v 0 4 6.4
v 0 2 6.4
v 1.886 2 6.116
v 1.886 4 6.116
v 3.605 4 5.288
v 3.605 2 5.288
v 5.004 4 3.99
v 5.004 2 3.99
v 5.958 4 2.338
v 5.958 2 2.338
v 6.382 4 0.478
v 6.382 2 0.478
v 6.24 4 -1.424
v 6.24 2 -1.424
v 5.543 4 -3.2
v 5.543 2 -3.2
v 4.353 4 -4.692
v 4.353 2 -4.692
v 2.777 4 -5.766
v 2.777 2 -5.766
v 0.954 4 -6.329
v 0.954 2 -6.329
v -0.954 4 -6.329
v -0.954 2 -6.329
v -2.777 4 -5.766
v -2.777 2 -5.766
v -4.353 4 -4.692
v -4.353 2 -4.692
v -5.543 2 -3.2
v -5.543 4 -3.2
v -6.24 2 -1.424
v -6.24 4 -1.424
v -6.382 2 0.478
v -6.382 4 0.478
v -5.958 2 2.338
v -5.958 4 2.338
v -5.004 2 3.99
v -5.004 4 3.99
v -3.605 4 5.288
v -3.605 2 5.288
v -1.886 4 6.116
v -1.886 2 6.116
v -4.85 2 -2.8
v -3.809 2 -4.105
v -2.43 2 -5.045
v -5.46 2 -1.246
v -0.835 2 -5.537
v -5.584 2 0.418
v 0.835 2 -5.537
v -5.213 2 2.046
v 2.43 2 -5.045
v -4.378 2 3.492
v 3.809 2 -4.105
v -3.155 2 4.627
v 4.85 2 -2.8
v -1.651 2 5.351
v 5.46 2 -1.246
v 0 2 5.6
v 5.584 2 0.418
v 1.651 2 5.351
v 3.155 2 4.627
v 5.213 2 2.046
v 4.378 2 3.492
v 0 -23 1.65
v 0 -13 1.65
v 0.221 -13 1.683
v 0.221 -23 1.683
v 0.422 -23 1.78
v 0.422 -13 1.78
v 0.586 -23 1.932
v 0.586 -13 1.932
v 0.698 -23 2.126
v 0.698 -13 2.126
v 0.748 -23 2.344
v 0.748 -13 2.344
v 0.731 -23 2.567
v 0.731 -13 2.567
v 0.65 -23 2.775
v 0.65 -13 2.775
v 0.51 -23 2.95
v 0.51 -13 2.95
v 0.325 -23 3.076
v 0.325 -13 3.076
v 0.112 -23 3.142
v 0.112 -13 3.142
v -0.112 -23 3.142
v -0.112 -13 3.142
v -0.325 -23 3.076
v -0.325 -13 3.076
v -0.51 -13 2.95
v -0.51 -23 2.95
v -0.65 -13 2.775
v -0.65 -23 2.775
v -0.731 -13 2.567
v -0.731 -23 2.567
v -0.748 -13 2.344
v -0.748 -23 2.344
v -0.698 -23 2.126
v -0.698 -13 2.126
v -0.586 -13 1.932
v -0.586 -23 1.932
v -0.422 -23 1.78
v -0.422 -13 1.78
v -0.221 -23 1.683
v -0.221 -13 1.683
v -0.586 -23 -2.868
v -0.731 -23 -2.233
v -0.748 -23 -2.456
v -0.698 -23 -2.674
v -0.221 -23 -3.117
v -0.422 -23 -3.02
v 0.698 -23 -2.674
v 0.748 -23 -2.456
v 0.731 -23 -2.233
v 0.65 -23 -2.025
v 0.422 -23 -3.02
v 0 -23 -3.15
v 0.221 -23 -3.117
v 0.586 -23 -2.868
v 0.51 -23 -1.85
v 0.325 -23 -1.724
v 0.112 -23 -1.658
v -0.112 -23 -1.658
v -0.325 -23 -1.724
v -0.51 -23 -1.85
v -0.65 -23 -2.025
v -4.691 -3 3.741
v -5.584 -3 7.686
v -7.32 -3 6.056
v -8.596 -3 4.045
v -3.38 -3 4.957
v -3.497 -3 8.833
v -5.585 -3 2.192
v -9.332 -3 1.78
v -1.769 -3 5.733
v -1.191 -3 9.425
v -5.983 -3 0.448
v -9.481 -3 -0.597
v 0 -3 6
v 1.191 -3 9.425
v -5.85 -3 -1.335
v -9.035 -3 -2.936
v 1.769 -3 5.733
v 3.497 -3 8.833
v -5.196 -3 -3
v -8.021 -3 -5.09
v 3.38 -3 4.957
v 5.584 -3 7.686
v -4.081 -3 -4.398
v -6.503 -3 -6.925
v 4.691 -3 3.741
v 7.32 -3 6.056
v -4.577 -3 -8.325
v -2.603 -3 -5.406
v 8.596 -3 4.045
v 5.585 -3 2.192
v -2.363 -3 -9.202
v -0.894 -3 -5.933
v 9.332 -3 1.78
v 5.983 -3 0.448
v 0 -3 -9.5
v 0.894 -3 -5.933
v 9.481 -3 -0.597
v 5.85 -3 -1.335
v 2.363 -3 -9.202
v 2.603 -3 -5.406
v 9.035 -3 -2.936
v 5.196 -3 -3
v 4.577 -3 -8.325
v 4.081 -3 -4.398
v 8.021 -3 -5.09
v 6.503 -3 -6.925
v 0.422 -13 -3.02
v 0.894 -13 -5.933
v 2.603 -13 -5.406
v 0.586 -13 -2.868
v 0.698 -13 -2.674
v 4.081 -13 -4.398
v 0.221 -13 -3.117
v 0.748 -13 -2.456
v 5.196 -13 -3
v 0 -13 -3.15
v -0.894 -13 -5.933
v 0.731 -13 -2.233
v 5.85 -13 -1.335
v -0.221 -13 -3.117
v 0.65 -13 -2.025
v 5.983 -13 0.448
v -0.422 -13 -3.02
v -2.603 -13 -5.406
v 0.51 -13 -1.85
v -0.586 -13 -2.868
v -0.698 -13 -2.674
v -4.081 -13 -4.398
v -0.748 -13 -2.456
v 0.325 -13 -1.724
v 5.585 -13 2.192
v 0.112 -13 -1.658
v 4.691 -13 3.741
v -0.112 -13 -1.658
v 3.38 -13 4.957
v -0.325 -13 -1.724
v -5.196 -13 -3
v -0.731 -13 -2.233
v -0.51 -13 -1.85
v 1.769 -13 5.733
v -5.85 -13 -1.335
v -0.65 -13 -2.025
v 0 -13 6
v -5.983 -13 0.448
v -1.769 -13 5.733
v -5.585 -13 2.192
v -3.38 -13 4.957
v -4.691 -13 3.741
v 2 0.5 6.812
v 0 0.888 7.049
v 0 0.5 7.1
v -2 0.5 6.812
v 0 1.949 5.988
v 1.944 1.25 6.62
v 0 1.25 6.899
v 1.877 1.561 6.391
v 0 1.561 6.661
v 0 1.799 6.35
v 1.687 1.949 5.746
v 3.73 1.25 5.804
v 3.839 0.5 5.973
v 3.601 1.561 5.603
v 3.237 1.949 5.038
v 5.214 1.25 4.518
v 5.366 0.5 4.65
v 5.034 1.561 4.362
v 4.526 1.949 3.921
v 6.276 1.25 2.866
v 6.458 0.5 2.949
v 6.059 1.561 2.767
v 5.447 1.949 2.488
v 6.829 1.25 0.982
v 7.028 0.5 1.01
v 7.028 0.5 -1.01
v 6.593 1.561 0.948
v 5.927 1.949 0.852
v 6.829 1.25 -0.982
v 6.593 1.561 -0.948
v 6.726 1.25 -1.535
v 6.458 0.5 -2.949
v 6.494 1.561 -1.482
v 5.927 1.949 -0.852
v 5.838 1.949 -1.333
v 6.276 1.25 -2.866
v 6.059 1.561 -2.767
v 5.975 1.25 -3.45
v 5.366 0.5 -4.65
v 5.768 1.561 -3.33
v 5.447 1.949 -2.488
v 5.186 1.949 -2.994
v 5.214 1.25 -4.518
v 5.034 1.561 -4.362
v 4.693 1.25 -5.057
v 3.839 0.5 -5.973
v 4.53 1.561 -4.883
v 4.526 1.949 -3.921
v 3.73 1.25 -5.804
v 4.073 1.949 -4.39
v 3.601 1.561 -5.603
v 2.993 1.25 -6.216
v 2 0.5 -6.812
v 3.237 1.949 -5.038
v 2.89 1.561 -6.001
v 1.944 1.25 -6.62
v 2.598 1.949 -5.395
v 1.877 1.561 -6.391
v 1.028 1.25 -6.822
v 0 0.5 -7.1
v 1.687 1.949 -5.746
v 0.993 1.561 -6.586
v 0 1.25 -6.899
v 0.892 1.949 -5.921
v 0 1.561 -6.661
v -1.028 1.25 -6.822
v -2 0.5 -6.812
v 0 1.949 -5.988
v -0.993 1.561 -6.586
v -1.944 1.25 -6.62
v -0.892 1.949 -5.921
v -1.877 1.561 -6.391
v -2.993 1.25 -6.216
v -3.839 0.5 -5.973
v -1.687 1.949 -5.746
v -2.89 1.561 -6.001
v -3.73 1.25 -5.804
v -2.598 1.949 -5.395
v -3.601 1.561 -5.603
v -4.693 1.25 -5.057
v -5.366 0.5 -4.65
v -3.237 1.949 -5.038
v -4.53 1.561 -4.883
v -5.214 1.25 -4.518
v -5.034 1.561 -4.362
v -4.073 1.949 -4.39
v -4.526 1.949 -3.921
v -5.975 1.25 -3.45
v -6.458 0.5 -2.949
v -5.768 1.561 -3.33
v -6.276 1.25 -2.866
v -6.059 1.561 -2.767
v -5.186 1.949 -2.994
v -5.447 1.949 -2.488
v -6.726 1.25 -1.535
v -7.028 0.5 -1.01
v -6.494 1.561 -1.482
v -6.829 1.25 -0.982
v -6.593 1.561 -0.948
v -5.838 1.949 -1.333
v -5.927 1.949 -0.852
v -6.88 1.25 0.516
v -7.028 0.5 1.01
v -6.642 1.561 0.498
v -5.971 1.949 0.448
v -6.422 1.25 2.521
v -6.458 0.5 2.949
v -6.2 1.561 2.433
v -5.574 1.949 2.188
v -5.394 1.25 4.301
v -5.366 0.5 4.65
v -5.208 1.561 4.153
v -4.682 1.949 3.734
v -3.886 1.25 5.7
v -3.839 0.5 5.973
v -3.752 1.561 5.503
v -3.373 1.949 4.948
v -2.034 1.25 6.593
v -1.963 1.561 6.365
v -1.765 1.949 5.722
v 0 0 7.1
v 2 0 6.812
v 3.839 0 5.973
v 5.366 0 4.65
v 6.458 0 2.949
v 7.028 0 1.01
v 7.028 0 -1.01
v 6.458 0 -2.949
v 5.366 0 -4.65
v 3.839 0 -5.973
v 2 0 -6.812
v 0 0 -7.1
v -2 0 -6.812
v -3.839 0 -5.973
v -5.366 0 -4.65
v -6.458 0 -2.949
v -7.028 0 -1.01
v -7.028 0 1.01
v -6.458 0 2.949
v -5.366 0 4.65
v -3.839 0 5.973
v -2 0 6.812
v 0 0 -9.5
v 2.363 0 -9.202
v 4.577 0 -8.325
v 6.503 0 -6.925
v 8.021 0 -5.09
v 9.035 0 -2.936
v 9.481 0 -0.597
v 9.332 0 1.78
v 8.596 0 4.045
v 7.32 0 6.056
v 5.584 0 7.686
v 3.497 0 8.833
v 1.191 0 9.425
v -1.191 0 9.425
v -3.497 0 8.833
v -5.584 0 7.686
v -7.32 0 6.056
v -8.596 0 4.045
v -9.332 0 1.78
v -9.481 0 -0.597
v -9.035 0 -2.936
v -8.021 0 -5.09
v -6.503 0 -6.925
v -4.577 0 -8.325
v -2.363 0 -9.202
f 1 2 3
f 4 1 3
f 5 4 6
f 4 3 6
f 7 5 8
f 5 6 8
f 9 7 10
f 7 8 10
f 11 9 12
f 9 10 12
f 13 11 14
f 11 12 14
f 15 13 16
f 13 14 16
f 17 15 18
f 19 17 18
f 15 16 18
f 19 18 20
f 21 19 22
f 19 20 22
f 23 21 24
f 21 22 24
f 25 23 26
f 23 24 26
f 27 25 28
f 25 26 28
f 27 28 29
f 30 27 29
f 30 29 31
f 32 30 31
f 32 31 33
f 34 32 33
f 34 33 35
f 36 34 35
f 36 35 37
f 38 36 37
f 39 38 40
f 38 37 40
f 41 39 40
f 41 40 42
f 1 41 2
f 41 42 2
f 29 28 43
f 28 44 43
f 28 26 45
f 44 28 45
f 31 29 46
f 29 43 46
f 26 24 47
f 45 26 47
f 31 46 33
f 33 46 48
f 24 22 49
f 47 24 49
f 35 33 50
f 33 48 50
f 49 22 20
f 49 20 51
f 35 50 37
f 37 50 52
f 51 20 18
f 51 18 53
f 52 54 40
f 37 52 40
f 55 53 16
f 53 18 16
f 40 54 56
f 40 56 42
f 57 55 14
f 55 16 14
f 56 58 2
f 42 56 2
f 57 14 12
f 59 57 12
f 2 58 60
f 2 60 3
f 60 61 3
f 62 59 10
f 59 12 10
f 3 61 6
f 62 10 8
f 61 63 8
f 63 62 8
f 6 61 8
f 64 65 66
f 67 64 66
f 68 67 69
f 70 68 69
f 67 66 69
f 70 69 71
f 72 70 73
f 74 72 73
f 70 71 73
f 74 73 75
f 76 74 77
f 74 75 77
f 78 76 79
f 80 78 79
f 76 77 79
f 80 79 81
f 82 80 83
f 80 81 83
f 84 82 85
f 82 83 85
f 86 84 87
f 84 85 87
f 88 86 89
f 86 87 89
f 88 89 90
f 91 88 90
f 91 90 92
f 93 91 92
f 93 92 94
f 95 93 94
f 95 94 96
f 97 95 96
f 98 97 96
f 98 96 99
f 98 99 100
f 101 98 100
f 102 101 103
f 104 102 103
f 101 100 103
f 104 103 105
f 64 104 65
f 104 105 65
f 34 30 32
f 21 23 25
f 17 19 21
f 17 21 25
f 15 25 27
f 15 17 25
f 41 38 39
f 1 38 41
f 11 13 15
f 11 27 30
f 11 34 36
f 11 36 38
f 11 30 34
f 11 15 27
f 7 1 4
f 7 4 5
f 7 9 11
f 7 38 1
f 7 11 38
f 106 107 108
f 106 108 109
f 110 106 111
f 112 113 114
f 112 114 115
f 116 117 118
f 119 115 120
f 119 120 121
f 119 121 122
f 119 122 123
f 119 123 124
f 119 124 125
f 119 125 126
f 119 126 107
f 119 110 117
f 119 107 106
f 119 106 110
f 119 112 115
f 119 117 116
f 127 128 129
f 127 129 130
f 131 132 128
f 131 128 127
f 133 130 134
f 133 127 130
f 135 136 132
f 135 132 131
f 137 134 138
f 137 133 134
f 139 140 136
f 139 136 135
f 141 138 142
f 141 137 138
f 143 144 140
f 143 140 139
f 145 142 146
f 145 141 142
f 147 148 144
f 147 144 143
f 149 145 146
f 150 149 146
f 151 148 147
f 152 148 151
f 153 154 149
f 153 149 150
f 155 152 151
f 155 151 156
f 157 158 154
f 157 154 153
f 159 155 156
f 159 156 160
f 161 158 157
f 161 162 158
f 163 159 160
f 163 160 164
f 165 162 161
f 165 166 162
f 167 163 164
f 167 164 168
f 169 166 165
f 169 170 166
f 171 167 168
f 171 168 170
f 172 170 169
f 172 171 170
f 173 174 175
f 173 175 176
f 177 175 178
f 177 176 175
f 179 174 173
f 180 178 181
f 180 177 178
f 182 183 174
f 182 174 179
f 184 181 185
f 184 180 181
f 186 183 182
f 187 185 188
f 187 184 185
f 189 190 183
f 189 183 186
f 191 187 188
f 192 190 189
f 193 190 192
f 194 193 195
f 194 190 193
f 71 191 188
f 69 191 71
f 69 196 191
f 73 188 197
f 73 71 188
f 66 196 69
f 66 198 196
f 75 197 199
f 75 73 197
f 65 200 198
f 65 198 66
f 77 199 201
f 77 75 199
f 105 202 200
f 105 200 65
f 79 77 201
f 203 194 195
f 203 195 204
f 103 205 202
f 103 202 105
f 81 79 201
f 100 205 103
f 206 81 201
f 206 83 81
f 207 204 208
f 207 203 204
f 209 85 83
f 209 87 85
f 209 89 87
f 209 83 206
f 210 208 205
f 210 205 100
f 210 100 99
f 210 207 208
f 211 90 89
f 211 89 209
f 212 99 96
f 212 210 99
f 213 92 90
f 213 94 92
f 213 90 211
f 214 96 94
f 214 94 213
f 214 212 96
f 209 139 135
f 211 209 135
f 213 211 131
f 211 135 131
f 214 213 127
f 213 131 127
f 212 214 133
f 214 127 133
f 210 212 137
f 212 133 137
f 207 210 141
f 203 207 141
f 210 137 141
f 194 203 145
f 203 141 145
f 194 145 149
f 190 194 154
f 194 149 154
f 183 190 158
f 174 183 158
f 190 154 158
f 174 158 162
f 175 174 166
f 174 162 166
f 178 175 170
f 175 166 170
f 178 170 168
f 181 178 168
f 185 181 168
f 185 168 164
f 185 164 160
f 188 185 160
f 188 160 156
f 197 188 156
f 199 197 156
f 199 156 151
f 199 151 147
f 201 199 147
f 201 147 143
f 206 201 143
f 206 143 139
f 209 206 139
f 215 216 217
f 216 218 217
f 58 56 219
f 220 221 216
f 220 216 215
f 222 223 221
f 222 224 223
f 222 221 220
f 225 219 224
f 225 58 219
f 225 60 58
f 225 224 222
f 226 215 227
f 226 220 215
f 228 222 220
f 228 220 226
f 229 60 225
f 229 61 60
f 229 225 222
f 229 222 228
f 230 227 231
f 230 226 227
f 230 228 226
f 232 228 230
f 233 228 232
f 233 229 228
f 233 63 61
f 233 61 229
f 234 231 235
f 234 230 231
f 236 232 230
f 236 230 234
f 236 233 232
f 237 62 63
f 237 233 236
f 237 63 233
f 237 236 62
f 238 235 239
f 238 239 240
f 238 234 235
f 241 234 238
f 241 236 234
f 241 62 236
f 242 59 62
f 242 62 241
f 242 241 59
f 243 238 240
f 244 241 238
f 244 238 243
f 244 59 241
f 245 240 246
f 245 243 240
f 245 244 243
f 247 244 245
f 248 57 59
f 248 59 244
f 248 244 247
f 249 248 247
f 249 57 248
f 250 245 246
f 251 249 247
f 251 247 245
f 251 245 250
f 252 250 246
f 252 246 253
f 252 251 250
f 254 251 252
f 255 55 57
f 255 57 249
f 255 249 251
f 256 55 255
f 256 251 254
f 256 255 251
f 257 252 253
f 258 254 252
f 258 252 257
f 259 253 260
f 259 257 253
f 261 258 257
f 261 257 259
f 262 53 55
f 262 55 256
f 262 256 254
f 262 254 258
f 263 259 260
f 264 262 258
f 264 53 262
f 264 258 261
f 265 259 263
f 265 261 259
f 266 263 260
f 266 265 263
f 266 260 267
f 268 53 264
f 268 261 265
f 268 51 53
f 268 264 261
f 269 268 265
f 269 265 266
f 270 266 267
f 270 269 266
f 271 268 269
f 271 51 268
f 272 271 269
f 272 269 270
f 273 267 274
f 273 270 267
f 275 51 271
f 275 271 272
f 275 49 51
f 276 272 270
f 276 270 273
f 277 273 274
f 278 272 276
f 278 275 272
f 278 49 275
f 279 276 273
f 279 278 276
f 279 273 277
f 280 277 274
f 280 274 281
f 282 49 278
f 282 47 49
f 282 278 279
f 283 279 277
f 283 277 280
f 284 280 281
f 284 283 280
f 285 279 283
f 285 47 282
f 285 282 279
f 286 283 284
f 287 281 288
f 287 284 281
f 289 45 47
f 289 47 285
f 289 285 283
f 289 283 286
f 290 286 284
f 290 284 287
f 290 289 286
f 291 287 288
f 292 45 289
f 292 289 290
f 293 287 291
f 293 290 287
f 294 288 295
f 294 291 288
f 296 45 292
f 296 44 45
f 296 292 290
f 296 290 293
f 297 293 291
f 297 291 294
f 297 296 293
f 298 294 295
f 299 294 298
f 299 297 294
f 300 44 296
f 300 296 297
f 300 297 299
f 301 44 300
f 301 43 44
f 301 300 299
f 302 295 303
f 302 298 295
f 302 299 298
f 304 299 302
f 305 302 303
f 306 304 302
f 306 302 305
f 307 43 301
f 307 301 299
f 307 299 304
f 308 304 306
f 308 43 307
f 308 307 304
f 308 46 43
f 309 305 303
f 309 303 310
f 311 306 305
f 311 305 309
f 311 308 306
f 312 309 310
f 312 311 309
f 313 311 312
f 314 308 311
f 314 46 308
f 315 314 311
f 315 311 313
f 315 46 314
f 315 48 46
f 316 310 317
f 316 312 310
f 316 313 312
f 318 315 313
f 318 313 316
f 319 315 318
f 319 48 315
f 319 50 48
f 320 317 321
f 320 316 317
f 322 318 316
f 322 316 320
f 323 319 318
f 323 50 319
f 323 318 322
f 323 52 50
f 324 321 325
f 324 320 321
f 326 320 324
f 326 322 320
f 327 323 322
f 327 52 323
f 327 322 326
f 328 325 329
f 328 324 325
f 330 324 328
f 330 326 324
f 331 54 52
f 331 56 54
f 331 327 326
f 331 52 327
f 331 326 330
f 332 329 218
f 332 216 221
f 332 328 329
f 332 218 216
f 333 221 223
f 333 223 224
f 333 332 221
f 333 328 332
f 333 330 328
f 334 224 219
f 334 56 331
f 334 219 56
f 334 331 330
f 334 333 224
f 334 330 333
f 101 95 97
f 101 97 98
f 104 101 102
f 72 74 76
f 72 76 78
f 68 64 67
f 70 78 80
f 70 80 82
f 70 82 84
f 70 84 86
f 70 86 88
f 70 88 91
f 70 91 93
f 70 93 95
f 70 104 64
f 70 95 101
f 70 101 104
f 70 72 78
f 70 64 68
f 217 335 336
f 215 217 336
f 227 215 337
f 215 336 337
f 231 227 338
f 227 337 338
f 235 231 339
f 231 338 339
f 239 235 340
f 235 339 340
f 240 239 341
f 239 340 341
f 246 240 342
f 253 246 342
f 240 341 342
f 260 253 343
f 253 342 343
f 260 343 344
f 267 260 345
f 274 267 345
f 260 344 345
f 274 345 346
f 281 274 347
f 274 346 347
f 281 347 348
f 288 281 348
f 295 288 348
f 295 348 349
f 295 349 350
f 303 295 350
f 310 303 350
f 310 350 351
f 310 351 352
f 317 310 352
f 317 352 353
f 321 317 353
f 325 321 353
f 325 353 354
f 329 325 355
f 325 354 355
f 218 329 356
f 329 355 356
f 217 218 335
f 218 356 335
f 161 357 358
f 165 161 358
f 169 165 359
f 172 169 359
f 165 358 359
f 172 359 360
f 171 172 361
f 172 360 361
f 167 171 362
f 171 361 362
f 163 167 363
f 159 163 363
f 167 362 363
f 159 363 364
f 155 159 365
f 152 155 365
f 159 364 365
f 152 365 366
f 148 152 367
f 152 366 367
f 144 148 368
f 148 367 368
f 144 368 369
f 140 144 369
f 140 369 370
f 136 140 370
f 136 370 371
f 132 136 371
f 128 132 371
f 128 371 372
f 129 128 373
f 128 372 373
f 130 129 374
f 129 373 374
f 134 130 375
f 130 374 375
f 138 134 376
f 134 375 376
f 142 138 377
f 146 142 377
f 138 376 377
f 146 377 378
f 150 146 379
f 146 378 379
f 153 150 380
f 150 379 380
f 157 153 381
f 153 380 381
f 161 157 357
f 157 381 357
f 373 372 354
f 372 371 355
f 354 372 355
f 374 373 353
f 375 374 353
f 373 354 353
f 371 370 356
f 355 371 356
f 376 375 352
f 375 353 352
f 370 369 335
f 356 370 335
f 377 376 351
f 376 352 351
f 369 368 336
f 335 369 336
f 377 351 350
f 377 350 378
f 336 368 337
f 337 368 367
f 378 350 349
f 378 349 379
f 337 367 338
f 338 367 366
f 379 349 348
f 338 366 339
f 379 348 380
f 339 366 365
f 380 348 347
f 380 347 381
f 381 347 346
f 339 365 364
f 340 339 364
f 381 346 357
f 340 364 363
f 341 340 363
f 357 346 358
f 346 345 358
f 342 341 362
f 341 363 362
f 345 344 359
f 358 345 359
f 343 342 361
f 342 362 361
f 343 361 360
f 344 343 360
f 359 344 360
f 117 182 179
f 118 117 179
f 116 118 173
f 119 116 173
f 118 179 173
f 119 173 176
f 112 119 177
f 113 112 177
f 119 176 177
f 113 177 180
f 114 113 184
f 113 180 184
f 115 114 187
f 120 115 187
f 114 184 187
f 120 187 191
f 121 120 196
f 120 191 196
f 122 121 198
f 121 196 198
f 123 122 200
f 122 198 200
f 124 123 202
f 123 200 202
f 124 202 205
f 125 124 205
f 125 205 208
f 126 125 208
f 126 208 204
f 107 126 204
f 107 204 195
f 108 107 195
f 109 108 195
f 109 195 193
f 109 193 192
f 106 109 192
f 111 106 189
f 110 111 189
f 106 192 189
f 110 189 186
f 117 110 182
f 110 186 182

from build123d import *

# Parameters (mm, degrees)
SKETCH_1_R      = 7.1
EXTRUDE_1_DEPTH = 2
FILLET_1_R      = 1.5
SKETCH_2_R      = 6.4
EXTRUDE_2_DEPTH = 2
SKETCH_3_R      = 6
EXTRUDE_3_DEPTH = 13
SKETCH_4_R      = 0.75
EXTRUDE_4_DEPTH = 10
SKETCH_5_R      = 9.5
SKETCH_5_R_2    = 6
EXTRUDE_5_DEPTH = 3


with BuildPart() as part:
    # 草图1 → 拉伸1 (new body)
    with BuildSketch(Plane(origin=(0, 0, 0), x_dir=(1, 0, 0), z_dir=(0, 1, 0))):
        with Locations(Location((0, 0, 0), (0, 0, 270))):
            Circle(SKETCH_1_R)
    extrude(amount=EXTRUDE_1_DEPTH)

    # 圆角1
    fillet_1_edges = [part.edges().sort_by_distance(p)[0] for p in [
        (0, 2, -7.1),
    ]]
    fillet(fillet_1_edges, radius=FILLET_1_R)

    # 草图2 → 拉伸2 (add)
    with BuildSketch(Plane(origin=(0, 2, 0), x_dir=(-1, 0, 0), z_dir=(0, 1, 0))):
        with Locations(Location((0, 0, 0), (0, 0, 90))):
            Circle(SKETCH_2_R)
    extrude(amount=EXTRUDE_2_DEPTH)

    # 草图3 → 拉伸3 (add)
    with BuildSketch(Plane.XZ):
        with Locations(Location((0, 0, 0), (0, 0, 90))):
            Circle(SKETCH_3_R)
    extrude(amount=EXTRUDE_3_DEPTH)

    # 草图4 → 拉伸4 (add)
    with BuildSketch(Plane.XZ.offset(13)):
        with Locations(Location((0, -2.4, 0), (0, 0, 270))):
            Circle(SKETCH_4_R)
        with Locations(Location((0, 2.4, 0), (0, 0, 270))):
            Circle(SKETCH_4_R)
    extrude(amount=EXTRUDE_4_DEPTH)

    # 草图5 → 拉伸5 (add)
    with BuildSketch(Plane.XZ):
        with Locations(Location((0, 0, 0), (0, 0, 270))):
            Circle(SKETCH_5_R)
        with Locations(Location((0, 0, 0), (0, 0, 90))):
            Circle(SKETCH_5_R_2, mode=Mode.SUBTRACT)
    extrude(amount=EXTRUDE_5_DEPTH)


solid = part.part
